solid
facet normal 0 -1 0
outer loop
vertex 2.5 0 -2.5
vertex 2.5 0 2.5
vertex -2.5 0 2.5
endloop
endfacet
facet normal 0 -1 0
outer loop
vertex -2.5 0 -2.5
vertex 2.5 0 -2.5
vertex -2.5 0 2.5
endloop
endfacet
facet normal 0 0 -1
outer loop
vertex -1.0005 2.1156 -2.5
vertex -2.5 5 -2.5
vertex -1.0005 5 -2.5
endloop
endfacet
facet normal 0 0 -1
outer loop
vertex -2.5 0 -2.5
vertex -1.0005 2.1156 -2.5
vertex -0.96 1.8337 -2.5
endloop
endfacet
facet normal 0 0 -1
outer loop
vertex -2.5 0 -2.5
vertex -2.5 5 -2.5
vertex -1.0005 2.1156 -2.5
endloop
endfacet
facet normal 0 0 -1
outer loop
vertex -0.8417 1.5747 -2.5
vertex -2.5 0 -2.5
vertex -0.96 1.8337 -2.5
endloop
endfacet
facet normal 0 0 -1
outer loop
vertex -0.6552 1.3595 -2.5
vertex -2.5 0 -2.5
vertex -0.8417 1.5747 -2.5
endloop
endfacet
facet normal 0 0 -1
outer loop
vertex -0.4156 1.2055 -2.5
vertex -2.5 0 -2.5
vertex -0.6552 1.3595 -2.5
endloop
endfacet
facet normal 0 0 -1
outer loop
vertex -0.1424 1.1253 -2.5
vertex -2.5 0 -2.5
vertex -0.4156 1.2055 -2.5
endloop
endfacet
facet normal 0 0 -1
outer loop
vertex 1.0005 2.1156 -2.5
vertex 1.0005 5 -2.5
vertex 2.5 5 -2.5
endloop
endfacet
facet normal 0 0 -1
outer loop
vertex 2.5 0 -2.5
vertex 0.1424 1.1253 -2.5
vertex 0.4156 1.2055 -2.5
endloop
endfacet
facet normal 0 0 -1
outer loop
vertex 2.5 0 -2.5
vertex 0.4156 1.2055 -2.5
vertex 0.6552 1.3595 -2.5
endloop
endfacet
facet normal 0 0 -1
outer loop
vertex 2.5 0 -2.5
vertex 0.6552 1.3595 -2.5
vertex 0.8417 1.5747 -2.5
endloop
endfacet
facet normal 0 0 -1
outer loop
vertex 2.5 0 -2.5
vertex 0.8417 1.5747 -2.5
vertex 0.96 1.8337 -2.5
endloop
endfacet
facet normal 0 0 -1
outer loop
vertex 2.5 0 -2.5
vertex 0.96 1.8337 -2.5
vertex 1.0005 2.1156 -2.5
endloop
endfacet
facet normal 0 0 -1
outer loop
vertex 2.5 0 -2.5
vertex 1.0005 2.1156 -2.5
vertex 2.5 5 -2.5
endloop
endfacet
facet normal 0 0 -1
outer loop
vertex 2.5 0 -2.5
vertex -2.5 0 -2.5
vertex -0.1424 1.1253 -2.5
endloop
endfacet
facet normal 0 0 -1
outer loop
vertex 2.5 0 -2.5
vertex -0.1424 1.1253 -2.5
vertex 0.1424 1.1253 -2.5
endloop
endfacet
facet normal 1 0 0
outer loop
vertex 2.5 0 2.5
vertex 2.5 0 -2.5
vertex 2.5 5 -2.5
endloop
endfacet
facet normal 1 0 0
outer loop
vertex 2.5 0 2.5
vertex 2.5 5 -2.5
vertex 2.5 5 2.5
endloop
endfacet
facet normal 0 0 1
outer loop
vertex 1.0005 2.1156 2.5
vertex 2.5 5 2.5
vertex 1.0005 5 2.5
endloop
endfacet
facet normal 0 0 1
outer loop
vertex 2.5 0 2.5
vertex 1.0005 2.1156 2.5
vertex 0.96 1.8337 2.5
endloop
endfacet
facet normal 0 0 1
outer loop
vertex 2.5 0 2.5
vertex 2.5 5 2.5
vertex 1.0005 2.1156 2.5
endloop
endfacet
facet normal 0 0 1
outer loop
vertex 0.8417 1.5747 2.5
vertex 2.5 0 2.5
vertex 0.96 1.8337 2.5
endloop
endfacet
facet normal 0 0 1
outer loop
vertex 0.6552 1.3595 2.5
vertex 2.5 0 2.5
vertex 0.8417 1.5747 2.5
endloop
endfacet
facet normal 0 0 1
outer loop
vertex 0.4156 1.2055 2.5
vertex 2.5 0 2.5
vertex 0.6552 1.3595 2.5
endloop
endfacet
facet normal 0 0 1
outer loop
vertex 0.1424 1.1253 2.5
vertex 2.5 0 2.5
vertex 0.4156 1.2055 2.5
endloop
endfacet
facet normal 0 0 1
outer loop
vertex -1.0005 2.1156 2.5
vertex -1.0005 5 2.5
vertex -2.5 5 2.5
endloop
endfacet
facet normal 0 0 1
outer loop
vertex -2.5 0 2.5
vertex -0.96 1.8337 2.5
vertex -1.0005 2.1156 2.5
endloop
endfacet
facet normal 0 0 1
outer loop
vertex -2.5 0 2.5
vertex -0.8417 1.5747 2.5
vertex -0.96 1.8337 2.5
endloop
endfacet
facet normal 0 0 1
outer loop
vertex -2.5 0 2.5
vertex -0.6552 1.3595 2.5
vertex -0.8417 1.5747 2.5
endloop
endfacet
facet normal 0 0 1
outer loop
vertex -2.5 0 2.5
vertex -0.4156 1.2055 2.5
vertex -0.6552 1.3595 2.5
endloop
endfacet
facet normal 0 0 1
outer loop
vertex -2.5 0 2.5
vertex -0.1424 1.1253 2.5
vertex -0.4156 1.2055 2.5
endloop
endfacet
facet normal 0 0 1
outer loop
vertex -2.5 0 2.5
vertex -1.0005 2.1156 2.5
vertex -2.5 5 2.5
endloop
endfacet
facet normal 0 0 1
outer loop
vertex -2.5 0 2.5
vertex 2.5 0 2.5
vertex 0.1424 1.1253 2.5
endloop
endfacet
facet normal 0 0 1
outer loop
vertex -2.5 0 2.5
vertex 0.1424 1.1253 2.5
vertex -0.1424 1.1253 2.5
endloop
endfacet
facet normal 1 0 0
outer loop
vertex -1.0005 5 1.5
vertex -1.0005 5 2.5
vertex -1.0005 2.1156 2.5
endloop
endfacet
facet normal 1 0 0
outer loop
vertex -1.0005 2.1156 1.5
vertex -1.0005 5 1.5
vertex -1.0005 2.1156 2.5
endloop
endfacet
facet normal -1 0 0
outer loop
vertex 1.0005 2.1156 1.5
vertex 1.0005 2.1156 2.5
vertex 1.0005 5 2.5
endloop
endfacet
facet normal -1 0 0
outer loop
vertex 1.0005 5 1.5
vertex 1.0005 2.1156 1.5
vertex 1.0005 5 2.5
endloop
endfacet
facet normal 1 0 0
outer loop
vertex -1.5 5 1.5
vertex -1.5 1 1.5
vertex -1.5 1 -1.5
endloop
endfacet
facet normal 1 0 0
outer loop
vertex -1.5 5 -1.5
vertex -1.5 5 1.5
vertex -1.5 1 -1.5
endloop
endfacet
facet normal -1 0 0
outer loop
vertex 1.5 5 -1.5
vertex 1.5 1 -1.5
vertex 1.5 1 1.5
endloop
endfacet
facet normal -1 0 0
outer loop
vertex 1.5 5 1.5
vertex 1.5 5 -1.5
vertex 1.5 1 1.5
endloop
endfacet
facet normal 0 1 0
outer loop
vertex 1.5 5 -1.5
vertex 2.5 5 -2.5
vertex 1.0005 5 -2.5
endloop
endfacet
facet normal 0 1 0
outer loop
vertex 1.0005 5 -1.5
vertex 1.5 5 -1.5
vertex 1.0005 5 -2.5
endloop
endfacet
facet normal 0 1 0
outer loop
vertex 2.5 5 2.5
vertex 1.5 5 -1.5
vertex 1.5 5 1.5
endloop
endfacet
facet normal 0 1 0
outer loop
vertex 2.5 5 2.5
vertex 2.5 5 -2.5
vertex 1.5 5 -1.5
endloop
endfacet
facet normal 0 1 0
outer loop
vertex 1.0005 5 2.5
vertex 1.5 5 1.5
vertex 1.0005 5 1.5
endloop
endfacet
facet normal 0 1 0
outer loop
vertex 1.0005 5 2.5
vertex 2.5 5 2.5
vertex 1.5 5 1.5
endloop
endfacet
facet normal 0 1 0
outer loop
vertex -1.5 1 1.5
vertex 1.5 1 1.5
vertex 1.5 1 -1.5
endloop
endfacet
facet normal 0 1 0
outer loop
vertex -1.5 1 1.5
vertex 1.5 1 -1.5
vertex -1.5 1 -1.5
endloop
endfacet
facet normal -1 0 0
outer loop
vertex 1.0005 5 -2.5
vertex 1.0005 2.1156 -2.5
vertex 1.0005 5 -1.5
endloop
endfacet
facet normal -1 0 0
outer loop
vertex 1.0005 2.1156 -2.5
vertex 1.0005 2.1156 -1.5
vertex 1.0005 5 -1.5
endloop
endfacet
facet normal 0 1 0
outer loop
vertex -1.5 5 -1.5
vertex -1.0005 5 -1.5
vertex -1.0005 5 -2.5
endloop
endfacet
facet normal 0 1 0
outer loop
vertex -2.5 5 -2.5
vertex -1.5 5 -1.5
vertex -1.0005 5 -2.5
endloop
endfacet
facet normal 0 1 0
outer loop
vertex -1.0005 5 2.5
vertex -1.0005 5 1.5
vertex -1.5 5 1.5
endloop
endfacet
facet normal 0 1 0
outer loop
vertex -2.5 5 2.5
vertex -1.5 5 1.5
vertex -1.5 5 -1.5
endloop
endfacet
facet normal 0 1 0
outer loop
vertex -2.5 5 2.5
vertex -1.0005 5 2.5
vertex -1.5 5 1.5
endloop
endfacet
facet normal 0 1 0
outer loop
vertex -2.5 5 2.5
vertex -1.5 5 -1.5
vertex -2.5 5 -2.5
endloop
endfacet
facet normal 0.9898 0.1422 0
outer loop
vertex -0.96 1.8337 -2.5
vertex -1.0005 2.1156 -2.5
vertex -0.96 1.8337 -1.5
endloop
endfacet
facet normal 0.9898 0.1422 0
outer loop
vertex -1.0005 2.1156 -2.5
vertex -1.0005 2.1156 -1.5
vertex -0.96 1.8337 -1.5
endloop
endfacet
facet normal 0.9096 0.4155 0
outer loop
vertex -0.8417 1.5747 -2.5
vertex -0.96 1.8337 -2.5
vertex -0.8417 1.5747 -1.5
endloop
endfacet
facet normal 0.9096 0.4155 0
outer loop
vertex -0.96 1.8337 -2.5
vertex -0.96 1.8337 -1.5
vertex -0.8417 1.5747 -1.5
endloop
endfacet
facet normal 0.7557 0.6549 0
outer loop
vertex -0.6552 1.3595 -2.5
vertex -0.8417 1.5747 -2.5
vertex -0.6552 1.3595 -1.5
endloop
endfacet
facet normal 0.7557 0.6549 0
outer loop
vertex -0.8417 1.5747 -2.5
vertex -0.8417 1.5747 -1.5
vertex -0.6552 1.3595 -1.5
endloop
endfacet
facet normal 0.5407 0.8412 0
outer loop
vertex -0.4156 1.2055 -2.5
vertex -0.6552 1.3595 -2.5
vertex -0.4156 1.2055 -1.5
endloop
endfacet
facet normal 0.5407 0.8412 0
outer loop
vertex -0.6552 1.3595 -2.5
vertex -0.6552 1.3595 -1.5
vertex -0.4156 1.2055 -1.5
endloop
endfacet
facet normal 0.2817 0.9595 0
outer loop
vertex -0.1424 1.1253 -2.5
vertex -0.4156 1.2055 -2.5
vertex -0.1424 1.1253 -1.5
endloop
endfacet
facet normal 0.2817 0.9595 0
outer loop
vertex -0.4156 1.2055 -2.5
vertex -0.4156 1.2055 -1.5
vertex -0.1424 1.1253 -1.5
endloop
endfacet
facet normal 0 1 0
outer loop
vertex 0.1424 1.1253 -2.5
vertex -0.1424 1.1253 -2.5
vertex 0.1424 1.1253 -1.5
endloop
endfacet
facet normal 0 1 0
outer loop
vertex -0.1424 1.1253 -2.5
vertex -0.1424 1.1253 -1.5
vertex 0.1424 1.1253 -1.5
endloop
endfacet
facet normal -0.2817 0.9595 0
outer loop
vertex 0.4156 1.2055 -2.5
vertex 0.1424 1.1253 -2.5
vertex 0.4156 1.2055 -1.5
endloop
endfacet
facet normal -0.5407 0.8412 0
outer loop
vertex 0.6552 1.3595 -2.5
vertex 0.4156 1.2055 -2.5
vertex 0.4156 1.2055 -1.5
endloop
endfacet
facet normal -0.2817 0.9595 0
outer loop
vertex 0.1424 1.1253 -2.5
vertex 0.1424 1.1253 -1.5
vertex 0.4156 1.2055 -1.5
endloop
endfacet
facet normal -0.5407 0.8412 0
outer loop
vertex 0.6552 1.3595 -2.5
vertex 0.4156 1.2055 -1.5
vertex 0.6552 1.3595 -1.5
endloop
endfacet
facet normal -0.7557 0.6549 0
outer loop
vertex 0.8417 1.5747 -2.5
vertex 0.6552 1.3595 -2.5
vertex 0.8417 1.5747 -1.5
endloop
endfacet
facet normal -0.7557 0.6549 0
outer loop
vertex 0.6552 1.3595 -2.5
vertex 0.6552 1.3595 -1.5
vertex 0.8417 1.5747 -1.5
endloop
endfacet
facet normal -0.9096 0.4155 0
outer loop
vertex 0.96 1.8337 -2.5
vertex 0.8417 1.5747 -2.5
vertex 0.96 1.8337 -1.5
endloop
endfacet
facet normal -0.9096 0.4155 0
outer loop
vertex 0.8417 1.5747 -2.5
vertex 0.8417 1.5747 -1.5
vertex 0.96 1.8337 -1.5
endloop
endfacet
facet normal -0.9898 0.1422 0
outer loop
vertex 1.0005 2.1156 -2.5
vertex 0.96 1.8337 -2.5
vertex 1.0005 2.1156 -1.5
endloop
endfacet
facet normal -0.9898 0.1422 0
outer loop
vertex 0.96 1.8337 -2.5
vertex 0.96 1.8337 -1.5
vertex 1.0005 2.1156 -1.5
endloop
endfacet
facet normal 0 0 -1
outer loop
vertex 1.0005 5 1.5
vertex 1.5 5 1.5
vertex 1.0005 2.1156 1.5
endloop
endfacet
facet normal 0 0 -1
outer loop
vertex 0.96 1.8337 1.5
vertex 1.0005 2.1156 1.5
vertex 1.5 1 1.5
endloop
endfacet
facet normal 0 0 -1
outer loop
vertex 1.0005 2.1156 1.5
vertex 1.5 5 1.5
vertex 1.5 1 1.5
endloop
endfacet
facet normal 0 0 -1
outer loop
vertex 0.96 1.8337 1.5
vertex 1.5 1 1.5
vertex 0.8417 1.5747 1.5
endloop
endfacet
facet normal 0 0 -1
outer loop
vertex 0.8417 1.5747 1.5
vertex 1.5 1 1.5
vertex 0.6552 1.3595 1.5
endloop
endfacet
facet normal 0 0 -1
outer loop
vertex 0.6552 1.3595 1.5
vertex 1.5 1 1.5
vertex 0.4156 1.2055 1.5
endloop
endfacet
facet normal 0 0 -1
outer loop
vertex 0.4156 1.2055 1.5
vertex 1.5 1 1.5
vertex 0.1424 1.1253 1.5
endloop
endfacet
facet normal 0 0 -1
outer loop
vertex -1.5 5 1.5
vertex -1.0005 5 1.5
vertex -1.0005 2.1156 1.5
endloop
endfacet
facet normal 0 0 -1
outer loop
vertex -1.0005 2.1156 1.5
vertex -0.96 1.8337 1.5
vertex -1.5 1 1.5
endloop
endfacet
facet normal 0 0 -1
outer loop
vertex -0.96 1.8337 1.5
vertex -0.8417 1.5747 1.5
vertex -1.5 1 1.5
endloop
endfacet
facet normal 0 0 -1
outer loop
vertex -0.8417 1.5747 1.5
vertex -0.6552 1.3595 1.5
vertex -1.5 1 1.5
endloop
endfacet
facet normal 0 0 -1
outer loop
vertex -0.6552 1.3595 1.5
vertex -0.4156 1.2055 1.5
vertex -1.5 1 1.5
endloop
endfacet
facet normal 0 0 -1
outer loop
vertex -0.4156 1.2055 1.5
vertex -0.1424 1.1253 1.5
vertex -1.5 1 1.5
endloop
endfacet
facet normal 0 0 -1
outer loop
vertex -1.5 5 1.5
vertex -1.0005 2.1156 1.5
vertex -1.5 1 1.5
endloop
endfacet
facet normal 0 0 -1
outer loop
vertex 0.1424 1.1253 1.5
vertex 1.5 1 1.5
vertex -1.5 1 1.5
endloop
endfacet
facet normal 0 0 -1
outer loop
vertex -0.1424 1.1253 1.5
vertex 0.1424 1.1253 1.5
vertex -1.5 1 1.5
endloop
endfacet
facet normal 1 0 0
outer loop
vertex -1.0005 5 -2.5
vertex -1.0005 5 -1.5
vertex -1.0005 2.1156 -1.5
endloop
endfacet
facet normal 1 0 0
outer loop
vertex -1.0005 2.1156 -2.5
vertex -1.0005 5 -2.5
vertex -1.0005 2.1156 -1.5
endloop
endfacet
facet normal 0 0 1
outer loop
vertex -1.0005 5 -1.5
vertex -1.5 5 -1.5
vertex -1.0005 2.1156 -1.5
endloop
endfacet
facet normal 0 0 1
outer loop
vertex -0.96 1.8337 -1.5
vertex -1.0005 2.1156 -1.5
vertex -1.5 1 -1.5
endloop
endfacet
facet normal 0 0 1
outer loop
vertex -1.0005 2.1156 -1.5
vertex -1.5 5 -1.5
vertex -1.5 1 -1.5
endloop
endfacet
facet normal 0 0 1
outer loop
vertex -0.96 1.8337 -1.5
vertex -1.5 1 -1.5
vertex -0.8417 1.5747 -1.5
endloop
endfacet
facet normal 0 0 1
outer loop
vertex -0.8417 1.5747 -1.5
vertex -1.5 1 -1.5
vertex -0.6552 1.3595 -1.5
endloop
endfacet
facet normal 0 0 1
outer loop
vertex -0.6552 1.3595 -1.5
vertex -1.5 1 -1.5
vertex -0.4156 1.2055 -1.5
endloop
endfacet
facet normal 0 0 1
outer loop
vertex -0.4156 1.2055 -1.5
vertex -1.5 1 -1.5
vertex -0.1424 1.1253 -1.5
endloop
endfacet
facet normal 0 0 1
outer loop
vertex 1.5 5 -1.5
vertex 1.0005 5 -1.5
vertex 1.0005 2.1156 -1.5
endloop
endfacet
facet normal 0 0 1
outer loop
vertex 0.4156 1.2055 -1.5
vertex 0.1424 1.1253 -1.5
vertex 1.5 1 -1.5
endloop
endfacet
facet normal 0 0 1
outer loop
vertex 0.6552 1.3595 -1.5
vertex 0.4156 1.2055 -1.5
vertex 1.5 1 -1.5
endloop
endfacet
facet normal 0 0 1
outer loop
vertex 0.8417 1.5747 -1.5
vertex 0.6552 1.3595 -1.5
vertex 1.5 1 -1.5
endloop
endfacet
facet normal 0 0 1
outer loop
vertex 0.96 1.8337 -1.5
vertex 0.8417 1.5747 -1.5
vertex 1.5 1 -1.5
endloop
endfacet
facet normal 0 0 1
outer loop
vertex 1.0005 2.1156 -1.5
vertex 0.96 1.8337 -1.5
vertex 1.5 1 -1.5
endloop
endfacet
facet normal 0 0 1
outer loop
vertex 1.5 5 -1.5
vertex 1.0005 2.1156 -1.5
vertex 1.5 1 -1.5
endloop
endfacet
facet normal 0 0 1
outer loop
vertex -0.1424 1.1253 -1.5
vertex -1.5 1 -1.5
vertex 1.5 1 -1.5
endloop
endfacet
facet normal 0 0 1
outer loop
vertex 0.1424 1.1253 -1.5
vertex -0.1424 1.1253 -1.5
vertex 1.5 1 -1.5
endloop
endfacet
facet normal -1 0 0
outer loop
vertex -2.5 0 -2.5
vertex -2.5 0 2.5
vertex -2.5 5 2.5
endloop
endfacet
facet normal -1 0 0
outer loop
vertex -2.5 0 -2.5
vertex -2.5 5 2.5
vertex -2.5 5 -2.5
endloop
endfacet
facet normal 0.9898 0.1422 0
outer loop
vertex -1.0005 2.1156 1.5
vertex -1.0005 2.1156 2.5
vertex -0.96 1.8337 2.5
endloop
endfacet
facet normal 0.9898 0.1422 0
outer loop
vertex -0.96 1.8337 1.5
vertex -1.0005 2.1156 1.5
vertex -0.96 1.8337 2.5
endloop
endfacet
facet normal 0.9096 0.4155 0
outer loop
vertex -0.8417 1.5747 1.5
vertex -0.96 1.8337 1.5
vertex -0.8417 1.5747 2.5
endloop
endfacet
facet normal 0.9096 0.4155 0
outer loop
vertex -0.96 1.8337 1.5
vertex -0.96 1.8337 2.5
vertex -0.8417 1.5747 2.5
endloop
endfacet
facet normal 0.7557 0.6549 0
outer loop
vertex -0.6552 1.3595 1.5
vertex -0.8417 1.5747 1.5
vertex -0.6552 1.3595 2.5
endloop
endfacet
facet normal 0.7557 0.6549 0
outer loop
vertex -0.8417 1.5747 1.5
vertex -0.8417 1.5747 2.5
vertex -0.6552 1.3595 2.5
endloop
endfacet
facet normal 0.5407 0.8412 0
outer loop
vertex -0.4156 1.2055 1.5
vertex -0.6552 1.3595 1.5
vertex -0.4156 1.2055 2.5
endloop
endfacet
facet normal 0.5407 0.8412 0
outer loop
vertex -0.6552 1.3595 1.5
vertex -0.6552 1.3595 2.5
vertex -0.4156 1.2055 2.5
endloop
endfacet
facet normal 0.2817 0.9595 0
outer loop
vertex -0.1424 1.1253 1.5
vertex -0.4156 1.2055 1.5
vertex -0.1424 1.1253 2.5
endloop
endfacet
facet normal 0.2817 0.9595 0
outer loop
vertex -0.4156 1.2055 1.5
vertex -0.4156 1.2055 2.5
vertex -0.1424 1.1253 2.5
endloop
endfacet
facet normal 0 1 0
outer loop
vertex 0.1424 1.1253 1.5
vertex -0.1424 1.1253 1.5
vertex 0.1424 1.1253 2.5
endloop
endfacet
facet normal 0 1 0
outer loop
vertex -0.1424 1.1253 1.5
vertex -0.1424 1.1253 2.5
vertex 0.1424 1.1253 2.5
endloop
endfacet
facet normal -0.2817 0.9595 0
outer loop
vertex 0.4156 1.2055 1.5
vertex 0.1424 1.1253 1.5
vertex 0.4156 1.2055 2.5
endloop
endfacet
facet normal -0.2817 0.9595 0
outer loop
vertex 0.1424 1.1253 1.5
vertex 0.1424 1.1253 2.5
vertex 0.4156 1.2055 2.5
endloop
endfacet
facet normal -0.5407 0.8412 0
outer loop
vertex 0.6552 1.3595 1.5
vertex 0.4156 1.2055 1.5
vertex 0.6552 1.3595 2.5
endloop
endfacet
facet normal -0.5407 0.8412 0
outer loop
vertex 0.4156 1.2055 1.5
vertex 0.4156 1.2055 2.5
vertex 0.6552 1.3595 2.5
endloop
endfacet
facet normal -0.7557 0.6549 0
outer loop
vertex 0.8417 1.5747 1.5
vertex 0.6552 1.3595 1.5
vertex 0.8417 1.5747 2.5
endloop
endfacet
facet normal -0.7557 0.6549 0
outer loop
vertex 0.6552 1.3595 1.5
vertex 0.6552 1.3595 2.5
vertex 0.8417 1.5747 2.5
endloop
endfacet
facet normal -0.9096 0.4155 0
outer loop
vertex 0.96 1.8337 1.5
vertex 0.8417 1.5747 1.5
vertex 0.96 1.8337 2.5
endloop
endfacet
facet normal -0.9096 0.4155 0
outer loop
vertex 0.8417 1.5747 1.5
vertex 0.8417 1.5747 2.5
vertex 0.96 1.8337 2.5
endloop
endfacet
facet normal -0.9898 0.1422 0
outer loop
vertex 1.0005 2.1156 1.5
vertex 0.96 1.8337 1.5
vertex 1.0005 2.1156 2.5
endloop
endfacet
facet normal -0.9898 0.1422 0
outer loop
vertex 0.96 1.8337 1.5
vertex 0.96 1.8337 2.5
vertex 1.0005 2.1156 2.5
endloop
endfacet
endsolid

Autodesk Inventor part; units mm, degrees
ref_plane "YZ Plane" through (0, 0, 0) normal (1, 0, 0) x (0, 1, 0)
ref_plane "XZ Plane" through (0, 0, 0) normal (0, 1, 0) x (-1, 0, 0)
ref_plane "XY Plane" through (0, 0, 0) normal (0, 0, 1) x (1, 0, 0)
sketch "Sketch1" plane through (0, 0, 0) normal (0, 1, 0) x (-1, 0, 0)
  line L0 (-2.5, 2.5) -> (2.5, 2.5)
  line L1 (2.5, 2.5) -> (2.5, -2.5)
  line L2 (2.5, -2.5) -> (-2.5, -2.5)
  line L3 (-2.5, -2.5) -> (-2.5, 2.5)
  line L4 (-2.5, 2.5) -> (2.5, -2.5) construction
  line L5 (2.5, 2.5) -> (-2.5, -2.5) construction
  point P0 (0, 0)
  dimension "d0" = 5
  dimension "d1" = 5
extrude "Extrusion1" add sketch "Sketch1" along normal blind 5
shell "Shell1" thickness 1 removed faces 1 at (-0.8333, 5, -0.8333)
sketch "Sketch3" plane through (-2.5, 0, 2.5) normal (0, 0, 1) x (1, 0, 0)
  line L0 (2.5, 9.1674) -> (2.5, 2.1156) construction
  line L1 (1.4995, 9.1674) -> (1.4995, 2.1156)
  line L2 (3.5005, 2.1156) -> (3.5005, 9.1674)
  arc A0 (3.5005, 9.1674) -> (1.4995, 9.1674) centre (2.5, 9.1674) ccw
  arc A1 (1.4995, 2.1156) -> (3.5005, 2.1156) centre (2.5, 2.1156) ccw
  point P0 (2.5, 0)
  point P1 (2.5, 5.6415)
extrude "Extrusion3" cut sketch "Sketch3" against normal through all
sketch "Sketch4" plane through (0, 5, 0) normal (0, 1, 0) x (1, 0, 0)
  point P0 (0, 0)
sketch "Sketch5" plane through (0, 5, 0) normal (0, 1, 0) x (1, 0, 0)
  point P0 (0, 0)
sketch "Sketch6" plane through (0, 5, 0) normal (0, 1, 0) x (1, 0, 0)
  point P0 (0, 0)
sketch "Sketch7" plane through (0, 0, 0) normal (0, -1, 0) x (1, 0, 0)
  point P0 (0, 0)
sketch "Sketch8" plane through (-2.5, 0, -2.5) normal (-1, 0, 0) x (0, 0, 1)
  point P0 (2.5, 0)
properties part number "snapfit_v10"
